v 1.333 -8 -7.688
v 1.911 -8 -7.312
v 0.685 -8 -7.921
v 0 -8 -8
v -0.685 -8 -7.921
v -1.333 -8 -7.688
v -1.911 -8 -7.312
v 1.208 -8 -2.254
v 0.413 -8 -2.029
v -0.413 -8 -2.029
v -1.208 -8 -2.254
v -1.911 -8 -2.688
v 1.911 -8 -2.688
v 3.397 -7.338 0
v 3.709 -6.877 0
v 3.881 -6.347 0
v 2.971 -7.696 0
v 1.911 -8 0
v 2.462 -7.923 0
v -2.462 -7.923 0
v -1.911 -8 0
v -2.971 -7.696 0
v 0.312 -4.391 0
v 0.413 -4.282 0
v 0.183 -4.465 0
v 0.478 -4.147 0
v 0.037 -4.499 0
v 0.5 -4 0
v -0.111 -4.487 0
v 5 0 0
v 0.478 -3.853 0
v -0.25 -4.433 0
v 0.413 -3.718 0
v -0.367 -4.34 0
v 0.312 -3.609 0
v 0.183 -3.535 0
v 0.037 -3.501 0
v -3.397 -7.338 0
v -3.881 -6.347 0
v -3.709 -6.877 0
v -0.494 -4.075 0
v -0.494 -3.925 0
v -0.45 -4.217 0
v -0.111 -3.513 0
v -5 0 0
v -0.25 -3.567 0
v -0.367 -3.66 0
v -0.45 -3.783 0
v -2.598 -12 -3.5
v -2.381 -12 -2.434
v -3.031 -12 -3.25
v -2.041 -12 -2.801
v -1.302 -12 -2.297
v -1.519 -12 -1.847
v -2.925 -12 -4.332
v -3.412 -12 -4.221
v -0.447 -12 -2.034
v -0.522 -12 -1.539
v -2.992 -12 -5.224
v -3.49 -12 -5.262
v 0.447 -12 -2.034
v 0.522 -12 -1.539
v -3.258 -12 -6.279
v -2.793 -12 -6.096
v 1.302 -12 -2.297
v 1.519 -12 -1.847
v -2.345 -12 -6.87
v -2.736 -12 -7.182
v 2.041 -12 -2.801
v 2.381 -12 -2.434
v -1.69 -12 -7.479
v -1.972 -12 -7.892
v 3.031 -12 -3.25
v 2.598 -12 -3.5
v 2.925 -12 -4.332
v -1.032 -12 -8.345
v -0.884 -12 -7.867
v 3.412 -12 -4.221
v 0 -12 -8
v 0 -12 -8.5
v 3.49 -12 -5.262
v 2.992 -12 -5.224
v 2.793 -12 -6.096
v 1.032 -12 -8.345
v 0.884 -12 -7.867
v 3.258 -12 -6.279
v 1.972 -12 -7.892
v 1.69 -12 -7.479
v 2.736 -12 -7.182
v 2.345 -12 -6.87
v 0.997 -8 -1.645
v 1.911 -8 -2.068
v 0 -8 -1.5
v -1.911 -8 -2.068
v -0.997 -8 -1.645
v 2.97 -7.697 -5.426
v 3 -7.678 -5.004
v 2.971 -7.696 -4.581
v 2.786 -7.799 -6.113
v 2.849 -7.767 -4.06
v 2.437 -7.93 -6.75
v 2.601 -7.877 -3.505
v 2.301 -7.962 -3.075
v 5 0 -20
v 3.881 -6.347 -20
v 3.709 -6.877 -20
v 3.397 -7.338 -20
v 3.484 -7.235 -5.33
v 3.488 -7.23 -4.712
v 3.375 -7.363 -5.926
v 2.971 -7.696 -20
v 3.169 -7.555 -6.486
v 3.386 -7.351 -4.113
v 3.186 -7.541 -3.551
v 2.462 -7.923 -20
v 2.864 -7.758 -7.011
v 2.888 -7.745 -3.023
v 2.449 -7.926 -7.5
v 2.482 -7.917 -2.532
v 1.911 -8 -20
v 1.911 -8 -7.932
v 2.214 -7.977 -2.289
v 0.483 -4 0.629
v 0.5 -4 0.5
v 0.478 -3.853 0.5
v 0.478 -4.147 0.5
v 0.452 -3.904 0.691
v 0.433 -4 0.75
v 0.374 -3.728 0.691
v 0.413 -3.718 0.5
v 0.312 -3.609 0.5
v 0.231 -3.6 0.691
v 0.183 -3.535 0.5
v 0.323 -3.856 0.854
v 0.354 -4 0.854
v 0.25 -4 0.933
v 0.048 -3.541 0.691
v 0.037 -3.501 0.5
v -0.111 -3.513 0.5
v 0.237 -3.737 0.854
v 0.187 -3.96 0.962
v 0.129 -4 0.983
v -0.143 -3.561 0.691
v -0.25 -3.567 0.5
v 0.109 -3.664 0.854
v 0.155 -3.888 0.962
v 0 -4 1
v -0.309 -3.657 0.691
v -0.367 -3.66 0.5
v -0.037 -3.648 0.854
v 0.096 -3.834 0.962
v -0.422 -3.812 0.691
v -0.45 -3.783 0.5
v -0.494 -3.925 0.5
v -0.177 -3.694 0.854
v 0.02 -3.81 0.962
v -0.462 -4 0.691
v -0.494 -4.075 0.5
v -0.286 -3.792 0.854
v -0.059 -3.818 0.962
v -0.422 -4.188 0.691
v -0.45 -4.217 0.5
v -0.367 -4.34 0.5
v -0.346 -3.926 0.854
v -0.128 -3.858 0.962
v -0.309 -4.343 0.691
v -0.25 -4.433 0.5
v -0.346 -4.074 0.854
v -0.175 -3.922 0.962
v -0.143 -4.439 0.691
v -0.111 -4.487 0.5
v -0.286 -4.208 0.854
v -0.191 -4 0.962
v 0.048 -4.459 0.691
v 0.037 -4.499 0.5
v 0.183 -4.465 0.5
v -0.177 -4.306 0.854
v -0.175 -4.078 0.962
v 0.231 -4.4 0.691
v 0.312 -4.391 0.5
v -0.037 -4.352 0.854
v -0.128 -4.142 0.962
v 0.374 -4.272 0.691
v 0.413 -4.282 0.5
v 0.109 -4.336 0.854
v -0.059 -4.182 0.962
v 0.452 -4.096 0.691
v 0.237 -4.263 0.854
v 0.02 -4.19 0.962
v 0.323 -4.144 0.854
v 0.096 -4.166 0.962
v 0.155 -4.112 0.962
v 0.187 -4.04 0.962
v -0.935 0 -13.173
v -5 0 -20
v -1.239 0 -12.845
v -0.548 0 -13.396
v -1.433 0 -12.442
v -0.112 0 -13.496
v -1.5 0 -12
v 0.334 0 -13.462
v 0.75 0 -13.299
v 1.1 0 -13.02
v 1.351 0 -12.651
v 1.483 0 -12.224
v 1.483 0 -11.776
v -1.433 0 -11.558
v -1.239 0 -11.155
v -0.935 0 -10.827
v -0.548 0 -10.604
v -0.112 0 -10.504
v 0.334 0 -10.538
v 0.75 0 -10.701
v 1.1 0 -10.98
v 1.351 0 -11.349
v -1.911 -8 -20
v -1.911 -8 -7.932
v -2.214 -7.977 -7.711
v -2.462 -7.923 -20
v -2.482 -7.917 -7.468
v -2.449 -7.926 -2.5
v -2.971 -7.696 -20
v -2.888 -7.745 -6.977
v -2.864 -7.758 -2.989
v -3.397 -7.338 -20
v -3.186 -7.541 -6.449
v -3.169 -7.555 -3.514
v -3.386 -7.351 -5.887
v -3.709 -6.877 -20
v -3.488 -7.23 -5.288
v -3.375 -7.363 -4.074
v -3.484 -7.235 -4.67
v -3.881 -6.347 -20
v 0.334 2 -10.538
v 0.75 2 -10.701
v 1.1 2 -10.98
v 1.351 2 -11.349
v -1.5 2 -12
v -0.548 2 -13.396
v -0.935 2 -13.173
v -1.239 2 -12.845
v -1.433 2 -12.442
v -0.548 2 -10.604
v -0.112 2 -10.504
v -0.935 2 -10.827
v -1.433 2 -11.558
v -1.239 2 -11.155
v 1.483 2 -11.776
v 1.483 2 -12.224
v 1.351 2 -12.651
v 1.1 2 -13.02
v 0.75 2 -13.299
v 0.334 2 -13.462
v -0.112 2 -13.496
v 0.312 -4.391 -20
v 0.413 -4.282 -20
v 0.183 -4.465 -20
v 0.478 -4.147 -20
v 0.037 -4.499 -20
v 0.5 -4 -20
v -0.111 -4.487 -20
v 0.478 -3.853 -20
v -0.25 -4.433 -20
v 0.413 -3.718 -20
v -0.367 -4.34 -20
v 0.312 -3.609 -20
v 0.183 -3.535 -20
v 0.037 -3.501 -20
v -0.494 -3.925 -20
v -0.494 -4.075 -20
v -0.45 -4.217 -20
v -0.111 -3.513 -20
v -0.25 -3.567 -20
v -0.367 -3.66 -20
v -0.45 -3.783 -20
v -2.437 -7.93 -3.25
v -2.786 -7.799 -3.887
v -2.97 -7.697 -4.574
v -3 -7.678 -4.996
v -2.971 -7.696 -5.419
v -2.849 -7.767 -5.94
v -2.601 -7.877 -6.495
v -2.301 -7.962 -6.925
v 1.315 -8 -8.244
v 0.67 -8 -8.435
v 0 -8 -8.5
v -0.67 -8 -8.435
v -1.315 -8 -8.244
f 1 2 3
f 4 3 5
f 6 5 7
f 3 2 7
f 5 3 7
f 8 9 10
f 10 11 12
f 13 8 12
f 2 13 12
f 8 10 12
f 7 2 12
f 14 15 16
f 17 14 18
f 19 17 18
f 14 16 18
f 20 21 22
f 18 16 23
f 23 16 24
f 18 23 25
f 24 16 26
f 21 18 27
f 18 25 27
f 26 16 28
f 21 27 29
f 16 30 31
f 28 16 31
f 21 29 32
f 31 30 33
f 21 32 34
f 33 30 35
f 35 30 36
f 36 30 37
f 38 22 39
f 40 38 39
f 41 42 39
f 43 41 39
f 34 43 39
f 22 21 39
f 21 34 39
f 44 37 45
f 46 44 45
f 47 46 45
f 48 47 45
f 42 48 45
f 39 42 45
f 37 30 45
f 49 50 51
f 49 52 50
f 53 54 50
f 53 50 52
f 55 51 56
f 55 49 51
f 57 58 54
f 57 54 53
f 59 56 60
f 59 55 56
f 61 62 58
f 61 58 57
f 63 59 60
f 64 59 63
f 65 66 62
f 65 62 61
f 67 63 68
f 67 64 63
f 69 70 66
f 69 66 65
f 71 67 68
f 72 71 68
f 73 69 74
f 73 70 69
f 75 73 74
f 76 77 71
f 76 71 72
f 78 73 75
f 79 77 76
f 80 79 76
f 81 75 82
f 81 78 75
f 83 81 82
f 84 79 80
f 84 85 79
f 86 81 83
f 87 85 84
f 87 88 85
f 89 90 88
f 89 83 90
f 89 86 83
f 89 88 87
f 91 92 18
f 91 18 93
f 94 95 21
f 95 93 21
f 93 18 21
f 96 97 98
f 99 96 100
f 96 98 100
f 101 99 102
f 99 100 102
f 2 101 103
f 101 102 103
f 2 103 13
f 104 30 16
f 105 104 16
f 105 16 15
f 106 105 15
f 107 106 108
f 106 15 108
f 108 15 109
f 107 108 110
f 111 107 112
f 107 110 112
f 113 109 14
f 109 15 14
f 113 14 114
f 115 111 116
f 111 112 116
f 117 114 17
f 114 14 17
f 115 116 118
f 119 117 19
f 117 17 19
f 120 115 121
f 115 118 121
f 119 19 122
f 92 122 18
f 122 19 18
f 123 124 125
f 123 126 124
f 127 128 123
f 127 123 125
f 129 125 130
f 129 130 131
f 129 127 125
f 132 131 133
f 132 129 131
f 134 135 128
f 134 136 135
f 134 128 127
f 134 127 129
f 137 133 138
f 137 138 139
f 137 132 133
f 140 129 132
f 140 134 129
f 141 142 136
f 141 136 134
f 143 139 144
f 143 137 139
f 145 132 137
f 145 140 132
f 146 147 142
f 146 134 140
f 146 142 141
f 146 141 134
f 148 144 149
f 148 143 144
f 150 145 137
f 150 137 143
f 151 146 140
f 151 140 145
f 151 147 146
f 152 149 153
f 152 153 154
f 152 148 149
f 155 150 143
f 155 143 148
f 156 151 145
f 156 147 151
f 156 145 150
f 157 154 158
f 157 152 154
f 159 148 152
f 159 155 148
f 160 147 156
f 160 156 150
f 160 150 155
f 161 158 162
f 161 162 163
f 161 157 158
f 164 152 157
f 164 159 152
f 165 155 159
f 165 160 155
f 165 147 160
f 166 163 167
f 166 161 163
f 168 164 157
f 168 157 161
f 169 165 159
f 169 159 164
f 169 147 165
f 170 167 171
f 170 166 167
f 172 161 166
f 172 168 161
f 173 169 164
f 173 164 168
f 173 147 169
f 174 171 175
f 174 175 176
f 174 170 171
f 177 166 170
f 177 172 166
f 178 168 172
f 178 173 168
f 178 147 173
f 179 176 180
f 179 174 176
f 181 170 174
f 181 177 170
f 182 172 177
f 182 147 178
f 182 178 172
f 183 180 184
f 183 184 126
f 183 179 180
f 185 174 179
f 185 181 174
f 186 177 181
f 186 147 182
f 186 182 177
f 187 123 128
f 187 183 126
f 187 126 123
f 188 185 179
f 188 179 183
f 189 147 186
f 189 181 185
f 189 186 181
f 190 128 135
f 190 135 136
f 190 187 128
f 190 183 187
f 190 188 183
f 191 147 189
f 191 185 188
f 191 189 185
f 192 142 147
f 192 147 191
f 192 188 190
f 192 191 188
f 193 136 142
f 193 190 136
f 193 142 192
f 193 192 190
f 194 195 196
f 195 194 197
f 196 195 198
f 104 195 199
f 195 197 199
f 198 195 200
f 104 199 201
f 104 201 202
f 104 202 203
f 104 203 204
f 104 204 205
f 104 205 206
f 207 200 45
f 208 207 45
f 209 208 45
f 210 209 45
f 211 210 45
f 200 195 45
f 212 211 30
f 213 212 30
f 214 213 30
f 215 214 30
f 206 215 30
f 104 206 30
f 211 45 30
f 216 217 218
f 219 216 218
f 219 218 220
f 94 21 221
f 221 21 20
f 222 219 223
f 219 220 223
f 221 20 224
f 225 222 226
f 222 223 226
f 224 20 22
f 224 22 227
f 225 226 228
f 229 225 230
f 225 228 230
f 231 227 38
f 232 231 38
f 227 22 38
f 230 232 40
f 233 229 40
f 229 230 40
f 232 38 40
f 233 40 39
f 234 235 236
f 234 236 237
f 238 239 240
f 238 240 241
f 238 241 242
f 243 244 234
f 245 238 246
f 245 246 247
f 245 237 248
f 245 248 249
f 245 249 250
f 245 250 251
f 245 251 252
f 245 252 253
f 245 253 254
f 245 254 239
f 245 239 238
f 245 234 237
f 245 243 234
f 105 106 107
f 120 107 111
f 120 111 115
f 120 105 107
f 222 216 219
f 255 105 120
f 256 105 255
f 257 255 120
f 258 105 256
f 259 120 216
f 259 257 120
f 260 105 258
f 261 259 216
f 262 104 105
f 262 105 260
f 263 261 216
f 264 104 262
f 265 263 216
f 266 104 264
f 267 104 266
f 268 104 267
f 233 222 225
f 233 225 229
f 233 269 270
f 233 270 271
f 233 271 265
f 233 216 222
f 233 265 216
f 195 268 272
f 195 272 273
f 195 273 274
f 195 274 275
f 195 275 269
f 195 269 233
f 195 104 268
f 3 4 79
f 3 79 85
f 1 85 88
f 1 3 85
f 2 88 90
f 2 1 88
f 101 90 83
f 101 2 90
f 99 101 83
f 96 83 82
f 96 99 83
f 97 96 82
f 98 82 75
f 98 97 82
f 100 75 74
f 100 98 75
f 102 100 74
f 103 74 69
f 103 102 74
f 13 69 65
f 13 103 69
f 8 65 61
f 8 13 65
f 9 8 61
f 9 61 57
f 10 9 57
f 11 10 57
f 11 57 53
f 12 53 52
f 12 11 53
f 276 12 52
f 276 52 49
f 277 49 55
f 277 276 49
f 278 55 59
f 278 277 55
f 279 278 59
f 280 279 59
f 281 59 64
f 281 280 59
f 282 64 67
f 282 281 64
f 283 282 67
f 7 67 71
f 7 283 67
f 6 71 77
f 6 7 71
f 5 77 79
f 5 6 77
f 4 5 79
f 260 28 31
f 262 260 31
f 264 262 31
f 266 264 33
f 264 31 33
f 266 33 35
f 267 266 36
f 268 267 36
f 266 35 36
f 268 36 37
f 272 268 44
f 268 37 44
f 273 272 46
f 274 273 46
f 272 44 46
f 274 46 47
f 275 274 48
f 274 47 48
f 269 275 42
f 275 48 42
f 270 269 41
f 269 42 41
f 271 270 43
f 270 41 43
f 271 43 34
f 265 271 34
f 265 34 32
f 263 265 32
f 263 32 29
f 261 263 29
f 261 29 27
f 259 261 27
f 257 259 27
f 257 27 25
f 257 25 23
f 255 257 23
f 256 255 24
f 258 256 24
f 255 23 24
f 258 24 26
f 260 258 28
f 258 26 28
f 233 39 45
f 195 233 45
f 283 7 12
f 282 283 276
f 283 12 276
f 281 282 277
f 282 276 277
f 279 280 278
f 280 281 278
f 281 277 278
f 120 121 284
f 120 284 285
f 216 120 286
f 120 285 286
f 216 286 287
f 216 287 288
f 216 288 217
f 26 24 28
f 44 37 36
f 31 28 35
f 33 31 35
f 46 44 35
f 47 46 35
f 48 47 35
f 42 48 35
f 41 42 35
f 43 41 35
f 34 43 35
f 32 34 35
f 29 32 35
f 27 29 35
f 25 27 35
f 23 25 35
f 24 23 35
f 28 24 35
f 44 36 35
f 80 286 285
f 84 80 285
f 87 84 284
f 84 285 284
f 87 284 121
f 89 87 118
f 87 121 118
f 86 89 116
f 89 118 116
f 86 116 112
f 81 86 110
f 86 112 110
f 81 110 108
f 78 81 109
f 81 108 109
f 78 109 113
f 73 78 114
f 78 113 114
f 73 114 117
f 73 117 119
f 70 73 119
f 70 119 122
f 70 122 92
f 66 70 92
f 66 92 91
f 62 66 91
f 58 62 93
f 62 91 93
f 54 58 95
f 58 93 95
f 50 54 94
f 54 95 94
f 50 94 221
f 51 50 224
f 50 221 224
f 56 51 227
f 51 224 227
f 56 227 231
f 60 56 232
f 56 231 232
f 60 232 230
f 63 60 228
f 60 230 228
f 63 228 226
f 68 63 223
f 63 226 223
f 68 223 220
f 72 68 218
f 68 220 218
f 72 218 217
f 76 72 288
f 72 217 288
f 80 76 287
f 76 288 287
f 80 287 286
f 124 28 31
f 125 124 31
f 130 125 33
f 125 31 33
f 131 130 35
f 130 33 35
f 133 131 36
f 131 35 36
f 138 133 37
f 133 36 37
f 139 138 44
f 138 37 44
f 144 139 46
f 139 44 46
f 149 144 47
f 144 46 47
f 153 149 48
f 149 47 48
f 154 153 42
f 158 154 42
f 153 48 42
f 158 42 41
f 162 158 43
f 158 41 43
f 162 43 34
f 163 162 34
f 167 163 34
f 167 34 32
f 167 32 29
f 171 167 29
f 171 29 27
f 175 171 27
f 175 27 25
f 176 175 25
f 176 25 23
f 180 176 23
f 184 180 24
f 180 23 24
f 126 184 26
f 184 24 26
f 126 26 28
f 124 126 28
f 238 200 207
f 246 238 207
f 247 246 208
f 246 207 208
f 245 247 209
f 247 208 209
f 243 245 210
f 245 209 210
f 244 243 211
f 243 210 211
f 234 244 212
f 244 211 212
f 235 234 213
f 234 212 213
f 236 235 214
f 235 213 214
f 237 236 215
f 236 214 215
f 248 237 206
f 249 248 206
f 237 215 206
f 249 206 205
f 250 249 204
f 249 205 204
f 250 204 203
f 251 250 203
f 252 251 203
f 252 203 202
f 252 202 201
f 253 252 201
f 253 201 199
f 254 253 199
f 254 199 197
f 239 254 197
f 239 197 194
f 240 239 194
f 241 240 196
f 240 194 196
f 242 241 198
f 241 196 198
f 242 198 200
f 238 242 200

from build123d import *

# Parameters (mm, degrees)
SKETCH1_R                = 0.5
BOSS_EXTRUDE1_DEPTH      = 20
SKETCH1_2_R              = 0.5
BOSS_EXTRUDE2_DEPTH      = 1
FILLET1_R                = 0.5
BOSS_EXTRUDE3_DEPTH      = 4
BOSS_EXTRUDE3_DEPTH_BACK = 2
SKETCH2_R                = 3.5
SKETCH2_R_2              = 3
SKETCH3_R                = 1.5
BOSS_EXTRUDE4_DEPTH      = 2


with BuildPart() as part:
    # Sketch1 → Boss-Extrude1 (new body)
    with BuildSketch(Plane.XY):
        with BuildLine():
            Line((-5, 0), (5, 0))
            Line((5, 0), (3.880800398, -6.347296355))
            ThreePointArc((3.880800398, -6.347296355), (3.196760111, -7.532088886), (1.911184892, -8))
            Line((1.911184892, -8), (-1.911184892, -8))
            ThreePointArc((-1.911184892, -8), (-3.196760111, -7.532088886), (-3.880800398, -6.347296355))
            Line((-3.880800398, -6.347296355), (-5, 0))
        make_face()
        with Locations((0, -4)):
            Circle(SKETCH1_R, mode=Mode.SUBTRACT)
    extrude(amount=-BOSS_EXTRUDE1_DEPTH)

    # Sketch2 → Boss-Extrude3 (add, two sides: drawn at the far end of the back side and taken through both)
    with BuildSketch(Plane.XZ.offset(8).offset(-BOSS_EXTRUDE3_DEPTH_BACK)):
        with Locations((0, -5)):
            Circle(SKETCH2_R)
        with Locations((0, -5)):
            Circle(SKETCH2_R_2, mode=Mode.SUBTRACT)
    extrude(amount=BOSS_EXTRUDE3_DEPTH + BOSS_EXTRUDE3_DEPTH_BACK)

    # Sketch3 → Boss-Extrude4 (add)
    with BuildSketch(Plane(origin=(0, 0, 0), x_dir=(1, 0, 0), z_dir=(0, 1, 0))):
        with Locations((0, 12)):
            Circle(SKETCH3_R)
    extrude(amount=BOSS_EXTRUDE4_DEPTH)


with BuildPart() as body_2:
    # Sketch1<2> → Boss-Extrude2 (new body)
    with BuildSketch(Plane.XY):
        with Locations((0, -4)):
            Circle(SKETCH1_2_R)
    extrude(amount=BOSS_EXTRUDE2_DEPTH)

    # Fillet1
    fillet1_edges = [body_2.edges().sort_by_distance(p)[0] for p in [
        (-0.5, -4, 1),
    ]]
    fillet(fillet1_edges, radius=FILLET1_R)


solid = Compound([part.part, body_2.part])
